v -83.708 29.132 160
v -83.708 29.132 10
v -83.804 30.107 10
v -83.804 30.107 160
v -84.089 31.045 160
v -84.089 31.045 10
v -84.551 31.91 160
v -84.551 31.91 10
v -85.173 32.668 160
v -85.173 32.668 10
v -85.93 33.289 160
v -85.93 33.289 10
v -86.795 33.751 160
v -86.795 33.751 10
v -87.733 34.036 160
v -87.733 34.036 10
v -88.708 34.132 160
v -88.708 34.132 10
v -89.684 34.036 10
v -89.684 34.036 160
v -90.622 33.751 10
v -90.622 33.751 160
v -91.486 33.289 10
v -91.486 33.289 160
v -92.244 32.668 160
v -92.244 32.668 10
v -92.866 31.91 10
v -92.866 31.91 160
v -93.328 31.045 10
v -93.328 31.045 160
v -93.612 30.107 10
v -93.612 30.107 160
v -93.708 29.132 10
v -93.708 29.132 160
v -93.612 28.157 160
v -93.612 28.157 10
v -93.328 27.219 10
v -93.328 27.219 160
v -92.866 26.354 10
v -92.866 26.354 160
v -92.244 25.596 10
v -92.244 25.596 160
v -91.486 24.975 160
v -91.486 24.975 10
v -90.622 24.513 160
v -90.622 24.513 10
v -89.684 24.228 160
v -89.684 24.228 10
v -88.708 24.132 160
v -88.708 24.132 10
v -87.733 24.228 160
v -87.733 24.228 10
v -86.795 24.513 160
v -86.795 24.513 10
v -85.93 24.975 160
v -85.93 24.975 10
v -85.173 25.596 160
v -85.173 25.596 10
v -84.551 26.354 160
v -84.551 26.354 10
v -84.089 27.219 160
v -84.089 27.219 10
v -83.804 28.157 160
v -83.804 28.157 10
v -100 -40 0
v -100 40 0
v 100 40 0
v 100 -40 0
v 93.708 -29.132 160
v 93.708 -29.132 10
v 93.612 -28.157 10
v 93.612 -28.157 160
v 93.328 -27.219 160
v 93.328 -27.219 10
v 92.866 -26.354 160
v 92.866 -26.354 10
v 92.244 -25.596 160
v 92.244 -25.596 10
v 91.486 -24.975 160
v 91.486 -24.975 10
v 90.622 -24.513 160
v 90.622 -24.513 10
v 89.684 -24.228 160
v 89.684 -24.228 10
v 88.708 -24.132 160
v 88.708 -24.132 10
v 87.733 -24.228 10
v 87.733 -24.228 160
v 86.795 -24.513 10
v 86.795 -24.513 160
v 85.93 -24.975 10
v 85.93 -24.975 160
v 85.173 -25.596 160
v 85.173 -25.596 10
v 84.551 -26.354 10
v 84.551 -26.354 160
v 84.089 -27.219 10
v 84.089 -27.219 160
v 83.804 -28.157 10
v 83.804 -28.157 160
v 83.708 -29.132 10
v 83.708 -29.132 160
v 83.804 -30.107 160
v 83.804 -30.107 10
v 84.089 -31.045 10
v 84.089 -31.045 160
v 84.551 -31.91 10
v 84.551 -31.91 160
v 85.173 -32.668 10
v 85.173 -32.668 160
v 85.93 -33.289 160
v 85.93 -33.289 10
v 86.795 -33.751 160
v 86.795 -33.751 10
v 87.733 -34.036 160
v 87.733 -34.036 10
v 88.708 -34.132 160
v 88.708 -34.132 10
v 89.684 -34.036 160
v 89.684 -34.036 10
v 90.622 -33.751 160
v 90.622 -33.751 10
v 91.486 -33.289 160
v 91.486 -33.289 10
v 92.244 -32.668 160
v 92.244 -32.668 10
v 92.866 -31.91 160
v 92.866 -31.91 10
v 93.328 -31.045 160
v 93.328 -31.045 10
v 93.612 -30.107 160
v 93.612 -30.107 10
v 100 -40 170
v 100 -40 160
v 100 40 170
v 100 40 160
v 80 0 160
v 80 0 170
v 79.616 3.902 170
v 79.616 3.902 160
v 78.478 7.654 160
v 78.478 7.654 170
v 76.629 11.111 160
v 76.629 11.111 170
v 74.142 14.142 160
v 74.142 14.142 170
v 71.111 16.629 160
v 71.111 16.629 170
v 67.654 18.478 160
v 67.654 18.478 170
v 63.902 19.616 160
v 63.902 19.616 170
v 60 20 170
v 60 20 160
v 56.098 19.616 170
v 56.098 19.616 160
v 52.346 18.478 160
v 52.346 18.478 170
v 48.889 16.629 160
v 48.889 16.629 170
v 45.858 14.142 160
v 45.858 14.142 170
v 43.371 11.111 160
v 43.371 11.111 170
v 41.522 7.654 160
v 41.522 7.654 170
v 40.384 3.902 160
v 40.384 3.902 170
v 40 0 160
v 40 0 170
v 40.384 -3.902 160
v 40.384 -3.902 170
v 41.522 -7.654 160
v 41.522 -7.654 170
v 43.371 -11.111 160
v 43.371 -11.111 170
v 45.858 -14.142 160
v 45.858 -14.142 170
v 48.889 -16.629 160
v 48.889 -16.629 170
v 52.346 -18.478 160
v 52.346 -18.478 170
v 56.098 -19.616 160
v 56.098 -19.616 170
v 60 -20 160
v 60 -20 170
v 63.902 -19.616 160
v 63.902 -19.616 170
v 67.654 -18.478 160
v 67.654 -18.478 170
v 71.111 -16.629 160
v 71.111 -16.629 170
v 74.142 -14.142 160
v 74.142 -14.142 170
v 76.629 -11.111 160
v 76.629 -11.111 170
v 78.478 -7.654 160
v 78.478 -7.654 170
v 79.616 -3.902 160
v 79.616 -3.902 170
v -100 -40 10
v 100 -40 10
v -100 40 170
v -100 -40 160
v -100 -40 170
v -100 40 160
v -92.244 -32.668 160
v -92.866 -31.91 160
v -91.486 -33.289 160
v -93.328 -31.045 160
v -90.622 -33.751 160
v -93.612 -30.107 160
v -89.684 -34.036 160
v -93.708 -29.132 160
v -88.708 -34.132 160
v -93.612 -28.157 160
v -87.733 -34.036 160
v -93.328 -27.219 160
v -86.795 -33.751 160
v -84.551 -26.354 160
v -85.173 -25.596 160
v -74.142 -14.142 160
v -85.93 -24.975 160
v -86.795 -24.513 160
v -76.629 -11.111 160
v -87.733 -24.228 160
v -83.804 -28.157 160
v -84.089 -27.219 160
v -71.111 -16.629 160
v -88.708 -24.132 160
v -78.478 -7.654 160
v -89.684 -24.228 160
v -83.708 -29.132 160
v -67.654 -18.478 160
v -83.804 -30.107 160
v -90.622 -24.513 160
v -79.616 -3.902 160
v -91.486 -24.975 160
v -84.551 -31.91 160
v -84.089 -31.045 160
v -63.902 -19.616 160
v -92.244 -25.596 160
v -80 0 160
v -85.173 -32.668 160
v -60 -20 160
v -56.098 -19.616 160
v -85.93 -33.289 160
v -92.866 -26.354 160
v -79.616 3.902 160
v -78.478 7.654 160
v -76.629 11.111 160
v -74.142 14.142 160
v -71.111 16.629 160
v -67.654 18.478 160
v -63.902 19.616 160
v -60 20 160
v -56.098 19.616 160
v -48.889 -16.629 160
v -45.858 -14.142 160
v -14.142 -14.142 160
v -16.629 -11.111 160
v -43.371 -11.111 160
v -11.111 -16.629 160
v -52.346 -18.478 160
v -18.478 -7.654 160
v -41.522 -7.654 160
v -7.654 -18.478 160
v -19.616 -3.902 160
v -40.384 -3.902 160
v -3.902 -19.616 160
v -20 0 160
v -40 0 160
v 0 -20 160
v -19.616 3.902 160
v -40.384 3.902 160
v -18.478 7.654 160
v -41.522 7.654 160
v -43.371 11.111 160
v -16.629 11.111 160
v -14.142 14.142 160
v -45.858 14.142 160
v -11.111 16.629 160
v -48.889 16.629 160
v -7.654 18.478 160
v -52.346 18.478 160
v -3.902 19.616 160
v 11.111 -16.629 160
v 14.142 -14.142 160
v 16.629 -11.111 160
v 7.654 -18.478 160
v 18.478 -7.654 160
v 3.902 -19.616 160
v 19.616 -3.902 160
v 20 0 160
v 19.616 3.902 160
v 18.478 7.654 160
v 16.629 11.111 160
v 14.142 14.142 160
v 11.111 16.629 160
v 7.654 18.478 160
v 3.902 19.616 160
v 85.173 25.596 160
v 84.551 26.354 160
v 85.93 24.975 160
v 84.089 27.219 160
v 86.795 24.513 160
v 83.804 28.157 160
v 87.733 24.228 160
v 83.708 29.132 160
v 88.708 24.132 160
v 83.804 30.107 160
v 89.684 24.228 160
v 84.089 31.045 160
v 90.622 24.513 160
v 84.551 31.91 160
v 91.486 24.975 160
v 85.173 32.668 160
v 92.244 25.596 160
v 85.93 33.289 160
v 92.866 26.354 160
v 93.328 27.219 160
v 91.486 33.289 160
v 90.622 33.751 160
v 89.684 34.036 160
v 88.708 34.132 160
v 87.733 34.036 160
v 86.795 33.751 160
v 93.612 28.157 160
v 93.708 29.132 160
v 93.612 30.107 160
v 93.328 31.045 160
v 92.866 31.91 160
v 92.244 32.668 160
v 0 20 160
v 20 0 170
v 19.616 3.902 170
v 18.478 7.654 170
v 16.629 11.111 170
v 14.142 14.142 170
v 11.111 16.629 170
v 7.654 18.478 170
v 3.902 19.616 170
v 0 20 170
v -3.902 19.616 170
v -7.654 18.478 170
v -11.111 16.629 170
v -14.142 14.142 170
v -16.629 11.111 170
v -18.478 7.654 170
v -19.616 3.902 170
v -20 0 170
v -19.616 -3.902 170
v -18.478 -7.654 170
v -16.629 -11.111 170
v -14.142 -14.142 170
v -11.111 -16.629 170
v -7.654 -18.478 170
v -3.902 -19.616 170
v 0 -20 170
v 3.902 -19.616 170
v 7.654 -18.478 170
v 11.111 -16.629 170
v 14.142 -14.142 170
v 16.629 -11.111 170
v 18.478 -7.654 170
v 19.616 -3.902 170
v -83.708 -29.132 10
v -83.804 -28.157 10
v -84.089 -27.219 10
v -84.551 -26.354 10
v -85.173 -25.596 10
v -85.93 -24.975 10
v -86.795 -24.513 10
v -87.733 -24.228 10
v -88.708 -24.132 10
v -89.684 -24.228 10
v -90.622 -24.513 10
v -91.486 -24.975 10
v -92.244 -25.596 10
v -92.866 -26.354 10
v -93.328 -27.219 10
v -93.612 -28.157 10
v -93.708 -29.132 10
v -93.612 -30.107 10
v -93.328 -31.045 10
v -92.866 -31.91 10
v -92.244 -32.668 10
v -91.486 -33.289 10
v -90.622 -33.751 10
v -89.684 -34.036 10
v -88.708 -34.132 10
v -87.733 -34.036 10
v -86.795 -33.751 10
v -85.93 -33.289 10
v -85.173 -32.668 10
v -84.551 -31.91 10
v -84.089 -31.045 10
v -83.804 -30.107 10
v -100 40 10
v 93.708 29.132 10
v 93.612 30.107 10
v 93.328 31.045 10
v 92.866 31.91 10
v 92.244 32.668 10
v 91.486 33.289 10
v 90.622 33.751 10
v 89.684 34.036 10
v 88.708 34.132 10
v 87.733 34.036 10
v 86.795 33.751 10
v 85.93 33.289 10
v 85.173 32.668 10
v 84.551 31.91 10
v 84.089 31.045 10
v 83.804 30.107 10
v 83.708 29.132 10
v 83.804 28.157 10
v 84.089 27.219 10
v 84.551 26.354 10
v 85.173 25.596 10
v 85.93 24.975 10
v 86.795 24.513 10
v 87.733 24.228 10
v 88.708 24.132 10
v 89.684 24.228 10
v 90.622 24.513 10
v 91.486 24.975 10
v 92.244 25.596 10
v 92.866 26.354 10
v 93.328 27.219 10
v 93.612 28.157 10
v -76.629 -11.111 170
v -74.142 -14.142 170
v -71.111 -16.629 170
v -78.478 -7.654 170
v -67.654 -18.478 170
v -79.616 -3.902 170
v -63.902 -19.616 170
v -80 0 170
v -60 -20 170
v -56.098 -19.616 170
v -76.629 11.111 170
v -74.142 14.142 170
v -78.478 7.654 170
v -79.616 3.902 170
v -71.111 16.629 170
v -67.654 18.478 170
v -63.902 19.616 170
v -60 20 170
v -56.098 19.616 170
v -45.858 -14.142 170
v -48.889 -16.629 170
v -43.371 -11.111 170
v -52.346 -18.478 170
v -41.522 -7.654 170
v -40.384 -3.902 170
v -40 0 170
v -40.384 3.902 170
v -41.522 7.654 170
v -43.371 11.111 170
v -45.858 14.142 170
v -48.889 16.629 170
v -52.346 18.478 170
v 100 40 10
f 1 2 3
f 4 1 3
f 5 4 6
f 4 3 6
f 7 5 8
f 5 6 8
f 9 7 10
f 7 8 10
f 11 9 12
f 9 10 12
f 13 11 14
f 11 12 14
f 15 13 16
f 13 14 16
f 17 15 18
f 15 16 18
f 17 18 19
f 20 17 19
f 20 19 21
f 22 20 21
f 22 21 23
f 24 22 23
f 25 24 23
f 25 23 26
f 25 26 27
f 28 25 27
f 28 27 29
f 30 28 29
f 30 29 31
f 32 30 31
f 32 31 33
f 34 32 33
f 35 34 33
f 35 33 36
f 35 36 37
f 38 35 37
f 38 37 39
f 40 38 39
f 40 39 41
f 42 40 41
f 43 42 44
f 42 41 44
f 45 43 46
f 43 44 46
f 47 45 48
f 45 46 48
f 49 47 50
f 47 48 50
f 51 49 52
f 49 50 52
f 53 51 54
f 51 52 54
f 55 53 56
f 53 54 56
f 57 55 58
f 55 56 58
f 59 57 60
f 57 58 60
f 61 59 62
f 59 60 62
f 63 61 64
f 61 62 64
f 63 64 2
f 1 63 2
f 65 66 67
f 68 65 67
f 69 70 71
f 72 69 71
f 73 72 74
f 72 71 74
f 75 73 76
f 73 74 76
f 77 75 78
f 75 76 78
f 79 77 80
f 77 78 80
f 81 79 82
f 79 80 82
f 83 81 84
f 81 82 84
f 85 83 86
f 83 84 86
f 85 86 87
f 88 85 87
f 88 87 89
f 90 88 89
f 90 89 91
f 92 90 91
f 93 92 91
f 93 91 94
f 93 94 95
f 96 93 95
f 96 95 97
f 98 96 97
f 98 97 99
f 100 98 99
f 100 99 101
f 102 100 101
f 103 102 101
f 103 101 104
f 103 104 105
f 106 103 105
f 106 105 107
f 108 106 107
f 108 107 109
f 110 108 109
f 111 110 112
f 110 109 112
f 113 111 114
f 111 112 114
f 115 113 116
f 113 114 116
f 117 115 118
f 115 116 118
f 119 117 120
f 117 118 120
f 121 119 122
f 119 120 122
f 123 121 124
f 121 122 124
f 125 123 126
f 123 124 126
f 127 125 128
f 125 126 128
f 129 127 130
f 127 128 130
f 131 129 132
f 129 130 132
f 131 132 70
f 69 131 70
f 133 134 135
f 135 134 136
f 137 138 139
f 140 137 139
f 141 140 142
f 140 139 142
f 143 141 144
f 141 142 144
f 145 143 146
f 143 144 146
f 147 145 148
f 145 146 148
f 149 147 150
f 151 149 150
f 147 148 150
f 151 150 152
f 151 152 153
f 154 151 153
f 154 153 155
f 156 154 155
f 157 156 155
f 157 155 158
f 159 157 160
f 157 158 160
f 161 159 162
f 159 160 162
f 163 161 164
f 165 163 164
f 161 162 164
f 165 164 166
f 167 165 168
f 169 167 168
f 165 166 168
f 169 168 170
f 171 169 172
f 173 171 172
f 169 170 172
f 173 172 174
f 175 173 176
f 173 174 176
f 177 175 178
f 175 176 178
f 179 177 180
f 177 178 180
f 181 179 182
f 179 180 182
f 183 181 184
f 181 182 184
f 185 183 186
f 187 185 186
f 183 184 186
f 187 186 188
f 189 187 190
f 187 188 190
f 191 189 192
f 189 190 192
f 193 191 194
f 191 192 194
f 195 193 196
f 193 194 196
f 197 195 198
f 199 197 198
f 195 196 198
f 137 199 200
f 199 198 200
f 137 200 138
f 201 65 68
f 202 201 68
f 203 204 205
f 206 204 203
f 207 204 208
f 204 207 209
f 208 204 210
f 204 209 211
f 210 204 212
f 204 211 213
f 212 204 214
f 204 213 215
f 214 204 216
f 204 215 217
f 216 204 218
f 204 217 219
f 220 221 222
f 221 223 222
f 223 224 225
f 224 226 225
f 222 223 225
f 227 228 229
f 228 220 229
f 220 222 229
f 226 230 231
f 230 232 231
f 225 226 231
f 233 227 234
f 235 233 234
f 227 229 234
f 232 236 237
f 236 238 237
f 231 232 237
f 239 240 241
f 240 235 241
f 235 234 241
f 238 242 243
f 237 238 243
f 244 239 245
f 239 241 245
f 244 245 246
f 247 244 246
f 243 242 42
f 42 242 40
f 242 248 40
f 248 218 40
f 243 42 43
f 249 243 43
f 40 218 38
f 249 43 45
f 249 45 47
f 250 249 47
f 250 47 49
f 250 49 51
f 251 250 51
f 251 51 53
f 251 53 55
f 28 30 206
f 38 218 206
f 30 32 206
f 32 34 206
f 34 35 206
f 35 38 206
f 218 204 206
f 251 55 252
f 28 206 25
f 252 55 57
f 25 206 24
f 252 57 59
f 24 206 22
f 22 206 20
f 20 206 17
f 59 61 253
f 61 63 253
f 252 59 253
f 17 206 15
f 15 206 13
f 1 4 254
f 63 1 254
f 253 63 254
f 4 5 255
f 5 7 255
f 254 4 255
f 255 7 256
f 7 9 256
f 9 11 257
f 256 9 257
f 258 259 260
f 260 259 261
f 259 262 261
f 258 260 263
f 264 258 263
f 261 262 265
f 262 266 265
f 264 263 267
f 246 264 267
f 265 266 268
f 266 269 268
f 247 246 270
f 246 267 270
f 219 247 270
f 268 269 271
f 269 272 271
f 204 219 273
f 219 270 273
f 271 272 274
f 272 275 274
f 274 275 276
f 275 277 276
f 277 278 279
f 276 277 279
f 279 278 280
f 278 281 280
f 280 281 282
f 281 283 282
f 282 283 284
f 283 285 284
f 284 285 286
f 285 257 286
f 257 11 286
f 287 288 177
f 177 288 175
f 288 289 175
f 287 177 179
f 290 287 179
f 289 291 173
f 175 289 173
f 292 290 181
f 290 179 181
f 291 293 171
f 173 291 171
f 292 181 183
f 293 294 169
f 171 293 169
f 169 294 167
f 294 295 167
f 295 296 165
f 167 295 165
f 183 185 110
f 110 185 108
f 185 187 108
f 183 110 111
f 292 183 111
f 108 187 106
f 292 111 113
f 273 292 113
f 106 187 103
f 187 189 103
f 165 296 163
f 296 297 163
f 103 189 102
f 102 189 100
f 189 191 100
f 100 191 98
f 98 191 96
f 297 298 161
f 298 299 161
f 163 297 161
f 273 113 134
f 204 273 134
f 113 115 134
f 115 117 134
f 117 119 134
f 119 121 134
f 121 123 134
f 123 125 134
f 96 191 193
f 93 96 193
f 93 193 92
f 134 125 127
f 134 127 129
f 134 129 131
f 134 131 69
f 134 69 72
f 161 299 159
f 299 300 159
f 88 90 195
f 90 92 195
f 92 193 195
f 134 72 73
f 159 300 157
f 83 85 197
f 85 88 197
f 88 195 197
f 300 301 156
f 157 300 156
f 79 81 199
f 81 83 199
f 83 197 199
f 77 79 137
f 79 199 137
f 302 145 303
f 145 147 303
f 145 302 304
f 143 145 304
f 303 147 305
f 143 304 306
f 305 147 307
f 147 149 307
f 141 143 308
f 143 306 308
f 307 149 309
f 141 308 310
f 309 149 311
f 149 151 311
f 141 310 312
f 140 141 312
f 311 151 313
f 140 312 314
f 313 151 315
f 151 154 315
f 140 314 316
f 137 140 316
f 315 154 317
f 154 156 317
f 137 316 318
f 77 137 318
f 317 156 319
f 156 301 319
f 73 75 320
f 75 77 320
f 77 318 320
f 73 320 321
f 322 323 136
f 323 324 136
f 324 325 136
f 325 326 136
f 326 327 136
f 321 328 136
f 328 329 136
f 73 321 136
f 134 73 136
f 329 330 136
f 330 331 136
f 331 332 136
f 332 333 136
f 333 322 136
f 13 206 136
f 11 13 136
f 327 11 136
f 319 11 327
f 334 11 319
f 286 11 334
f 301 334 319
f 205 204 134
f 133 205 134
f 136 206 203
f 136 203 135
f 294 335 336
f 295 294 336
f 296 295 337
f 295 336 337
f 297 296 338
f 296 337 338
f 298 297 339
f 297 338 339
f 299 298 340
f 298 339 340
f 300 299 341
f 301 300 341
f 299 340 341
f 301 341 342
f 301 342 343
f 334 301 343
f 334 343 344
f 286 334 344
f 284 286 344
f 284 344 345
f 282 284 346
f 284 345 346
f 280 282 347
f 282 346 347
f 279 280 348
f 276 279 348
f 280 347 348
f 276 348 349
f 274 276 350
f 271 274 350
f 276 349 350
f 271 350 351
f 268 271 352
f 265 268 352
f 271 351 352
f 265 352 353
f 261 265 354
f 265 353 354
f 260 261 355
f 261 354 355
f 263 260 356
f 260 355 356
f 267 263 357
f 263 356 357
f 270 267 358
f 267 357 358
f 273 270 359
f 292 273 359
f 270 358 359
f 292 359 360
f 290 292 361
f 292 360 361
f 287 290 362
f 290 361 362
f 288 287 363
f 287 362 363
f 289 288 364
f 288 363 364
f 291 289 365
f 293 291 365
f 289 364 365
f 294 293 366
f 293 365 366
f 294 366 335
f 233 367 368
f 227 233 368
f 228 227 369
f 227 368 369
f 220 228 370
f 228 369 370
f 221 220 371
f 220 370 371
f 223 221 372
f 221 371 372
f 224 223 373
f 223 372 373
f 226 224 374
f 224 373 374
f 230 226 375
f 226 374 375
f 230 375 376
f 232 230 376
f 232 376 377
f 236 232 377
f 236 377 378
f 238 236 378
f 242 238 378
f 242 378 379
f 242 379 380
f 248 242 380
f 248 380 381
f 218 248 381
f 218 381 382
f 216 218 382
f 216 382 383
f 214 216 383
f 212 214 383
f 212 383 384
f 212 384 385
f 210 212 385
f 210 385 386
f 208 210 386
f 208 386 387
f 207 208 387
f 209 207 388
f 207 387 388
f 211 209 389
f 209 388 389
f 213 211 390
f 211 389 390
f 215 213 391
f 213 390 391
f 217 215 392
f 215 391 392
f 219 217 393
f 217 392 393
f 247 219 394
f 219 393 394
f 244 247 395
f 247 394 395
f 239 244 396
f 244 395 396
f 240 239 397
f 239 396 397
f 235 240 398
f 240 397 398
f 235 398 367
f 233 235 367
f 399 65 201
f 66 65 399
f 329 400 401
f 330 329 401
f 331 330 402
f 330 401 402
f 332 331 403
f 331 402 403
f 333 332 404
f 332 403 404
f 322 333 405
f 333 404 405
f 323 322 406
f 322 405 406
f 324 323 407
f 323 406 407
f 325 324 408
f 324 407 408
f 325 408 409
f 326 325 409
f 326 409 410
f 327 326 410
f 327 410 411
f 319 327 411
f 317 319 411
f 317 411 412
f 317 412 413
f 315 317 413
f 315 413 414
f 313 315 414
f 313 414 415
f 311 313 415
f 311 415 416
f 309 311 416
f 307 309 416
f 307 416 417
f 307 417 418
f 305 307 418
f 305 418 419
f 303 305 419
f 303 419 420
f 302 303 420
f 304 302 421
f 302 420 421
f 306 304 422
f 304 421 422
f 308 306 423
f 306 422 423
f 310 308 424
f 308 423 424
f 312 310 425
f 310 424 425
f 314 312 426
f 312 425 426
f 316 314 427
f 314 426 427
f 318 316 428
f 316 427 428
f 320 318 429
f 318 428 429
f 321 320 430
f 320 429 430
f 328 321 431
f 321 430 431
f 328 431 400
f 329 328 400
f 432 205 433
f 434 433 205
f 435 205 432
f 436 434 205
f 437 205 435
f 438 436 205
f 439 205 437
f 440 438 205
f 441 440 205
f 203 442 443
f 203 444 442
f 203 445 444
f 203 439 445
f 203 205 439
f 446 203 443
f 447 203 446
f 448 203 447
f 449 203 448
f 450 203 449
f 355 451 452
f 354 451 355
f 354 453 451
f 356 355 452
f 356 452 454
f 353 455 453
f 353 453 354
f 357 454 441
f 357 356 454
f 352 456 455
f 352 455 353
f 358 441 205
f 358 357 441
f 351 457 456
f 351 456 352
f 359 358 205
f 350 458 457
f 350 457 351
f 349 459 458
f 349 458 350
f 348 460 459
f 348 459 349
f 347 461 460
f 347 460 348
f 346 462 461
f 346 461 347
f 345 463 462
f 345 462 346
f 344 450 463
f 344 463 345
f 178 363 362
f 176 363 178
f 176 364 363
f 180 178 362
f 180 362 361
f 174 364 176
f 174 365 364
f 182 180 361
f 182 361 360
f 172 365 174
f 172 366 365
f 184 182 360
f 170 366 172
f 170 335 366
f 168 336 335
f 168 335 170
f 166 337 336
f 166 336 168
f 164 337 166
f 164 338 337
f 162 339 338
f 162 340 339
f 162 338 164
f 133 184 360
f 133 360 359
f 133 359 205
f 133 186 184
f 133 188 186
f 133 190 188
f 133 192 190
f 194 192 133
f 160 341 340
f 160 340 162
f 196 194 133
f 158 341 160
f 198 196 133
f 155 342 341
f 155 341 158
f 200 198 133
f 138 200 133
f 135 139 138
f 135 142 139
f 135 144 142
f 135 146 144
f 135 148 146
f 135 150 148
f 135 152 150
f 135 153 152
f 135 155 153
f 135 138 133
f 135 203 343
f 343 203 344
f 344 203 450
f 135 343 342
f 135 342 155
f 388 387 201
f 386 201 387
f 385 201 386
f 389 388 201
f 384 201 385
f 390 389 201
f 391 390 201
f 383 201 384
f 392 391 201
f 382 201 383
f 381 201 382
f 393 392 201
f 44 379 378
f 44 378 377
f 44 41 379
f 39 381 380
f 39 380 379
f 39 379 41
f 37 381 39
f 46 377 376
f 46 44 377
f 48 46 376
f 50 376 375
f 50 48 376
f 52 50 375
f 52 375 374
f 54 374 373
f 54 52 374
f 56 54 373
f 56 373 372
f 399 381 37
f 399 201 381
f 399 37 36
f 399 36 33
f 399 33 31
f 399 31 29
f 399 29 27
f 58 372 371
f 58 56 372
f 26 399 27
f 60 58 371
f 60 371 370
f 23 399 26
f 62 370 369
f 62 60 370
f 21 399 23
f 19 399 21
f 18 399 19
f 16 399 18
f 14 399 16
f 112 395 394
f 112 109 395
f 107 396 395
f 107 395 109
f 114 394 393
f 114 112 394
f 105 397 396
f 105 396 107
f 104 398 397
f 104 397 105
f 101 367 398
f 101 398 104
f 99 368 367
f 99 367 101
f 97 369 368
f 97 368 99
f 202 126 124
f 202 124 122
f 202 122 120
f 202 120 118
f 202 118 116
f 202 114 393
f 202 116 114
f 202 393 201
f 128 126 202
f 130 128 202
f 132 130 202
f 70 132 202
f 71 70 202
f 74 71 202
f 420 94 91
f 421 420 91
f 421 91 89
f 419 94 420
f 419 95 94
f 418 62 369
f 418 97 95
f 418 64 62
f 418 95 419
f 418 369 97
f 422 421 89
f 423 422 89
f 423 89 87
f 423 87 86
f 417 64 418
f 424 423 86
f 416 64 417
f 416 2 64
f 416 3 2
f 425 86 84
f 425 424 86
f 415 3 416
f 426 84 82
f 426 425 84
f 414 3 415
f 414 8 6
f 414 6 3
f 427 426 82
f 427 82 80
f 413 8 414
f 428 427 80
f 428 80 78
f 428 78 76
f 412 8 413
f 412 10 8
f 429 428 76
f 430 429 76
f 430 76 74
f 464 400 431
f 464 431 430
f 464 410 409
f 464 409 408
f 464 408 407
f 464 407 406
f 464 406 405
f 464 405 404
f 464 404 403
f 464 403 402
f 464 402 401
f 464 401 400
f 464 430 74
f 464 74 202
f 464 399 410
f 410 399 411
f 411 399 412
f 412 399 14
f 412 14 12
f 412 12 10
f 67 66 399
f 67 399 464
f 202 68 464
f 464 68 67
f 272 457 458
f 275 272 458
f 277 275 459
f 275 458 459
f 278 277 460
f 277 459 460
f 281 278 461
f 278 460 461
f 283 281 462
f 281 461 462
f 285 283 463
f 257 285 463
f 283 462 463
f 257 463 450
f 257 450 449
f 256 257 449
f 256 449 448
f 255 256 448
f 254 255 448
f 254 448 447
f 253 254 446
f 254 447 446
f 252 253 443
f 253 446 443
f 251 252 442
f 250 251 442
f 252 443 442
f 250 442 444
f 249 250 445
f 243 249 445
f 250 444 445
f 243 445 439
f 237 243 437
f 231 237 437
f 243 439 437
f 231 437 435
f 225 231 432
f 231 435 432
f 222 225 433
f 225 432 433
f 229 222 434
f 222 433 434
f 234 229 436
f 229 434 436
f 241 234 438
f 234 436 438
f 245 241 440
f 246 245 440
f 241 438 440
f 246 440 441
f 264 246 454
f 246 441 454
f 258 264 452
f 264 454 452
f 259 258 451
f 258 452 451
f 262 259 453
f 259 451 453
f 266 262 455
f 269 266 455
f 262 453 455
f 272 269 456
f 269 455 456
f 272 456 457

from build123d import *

# Parameters (mm, degrees)
SKETCH1_W           = 200
SKETCH1_H           = 80
BOSS_EXTRUDE1_DEPTH = 10
SKETCH2_R           = 5
BOSS_EXTRUDE2_DEPTH = 160
SKETCH3_W           = 200
SKETCH3_H           = 80
BOSS_EXTRUDE3_DEPTH = 10
SKETCH7_R           = 20
CUT_EXTRUDE1_DEPTH  = 10


with BuildPart() as part:
    # Sketch1 → Boss-Extrude1 (new body)
    with BuildSketch(Plane.XY):
        Rectangle(SKETCH1_W, SKETCH1_H)
    extrude(amount=BOSS_EXTRUDE1_DEPTH)

    # Sketch2 → Boss-Extrude2 (add)
    with BuildSketch(Plane.XY):
        with Locations((-88.708175614, 29.131974832)):
            Circle(SKETCH2_R)
        with Locations((88.708175614, 29.131974832)):
            Circle(SKETCH2_R)
        with Locations((88.708175614, -29.131974832)):
            Circle(SKETCH2_R)
        with Locations((-88.708175614, -29.131974832)):
            Circle(SKETCH2_R)
    extrude(amount=BOSS_EXTRUDE2_DEPTH)

    # Sketch3 → Boss-Extrude3 (add)
    with BuildSketch(Plane.XY.offset(160)):
        Rectangle(SKETCH3_W, SKETCH3_H)
    extrude(amount=BOSS_EXTRUDE3_DEPTH)

    # Sketch7 → Cut-Extrude1 (cut)
    with BuildSketch(Plane.XY.offset(170)):
        Circle(SKETCH7_R)
        with Locations((-60, 0)):
            Circle(SKETCH7_R)
        with Locations((60, 0)):
            Circle(SKETCH7_R)
    extrude(amount=-CUT_EXTRUDE1_DEPTH, mode=Mode.SUBTRACT)


solid = part.part
